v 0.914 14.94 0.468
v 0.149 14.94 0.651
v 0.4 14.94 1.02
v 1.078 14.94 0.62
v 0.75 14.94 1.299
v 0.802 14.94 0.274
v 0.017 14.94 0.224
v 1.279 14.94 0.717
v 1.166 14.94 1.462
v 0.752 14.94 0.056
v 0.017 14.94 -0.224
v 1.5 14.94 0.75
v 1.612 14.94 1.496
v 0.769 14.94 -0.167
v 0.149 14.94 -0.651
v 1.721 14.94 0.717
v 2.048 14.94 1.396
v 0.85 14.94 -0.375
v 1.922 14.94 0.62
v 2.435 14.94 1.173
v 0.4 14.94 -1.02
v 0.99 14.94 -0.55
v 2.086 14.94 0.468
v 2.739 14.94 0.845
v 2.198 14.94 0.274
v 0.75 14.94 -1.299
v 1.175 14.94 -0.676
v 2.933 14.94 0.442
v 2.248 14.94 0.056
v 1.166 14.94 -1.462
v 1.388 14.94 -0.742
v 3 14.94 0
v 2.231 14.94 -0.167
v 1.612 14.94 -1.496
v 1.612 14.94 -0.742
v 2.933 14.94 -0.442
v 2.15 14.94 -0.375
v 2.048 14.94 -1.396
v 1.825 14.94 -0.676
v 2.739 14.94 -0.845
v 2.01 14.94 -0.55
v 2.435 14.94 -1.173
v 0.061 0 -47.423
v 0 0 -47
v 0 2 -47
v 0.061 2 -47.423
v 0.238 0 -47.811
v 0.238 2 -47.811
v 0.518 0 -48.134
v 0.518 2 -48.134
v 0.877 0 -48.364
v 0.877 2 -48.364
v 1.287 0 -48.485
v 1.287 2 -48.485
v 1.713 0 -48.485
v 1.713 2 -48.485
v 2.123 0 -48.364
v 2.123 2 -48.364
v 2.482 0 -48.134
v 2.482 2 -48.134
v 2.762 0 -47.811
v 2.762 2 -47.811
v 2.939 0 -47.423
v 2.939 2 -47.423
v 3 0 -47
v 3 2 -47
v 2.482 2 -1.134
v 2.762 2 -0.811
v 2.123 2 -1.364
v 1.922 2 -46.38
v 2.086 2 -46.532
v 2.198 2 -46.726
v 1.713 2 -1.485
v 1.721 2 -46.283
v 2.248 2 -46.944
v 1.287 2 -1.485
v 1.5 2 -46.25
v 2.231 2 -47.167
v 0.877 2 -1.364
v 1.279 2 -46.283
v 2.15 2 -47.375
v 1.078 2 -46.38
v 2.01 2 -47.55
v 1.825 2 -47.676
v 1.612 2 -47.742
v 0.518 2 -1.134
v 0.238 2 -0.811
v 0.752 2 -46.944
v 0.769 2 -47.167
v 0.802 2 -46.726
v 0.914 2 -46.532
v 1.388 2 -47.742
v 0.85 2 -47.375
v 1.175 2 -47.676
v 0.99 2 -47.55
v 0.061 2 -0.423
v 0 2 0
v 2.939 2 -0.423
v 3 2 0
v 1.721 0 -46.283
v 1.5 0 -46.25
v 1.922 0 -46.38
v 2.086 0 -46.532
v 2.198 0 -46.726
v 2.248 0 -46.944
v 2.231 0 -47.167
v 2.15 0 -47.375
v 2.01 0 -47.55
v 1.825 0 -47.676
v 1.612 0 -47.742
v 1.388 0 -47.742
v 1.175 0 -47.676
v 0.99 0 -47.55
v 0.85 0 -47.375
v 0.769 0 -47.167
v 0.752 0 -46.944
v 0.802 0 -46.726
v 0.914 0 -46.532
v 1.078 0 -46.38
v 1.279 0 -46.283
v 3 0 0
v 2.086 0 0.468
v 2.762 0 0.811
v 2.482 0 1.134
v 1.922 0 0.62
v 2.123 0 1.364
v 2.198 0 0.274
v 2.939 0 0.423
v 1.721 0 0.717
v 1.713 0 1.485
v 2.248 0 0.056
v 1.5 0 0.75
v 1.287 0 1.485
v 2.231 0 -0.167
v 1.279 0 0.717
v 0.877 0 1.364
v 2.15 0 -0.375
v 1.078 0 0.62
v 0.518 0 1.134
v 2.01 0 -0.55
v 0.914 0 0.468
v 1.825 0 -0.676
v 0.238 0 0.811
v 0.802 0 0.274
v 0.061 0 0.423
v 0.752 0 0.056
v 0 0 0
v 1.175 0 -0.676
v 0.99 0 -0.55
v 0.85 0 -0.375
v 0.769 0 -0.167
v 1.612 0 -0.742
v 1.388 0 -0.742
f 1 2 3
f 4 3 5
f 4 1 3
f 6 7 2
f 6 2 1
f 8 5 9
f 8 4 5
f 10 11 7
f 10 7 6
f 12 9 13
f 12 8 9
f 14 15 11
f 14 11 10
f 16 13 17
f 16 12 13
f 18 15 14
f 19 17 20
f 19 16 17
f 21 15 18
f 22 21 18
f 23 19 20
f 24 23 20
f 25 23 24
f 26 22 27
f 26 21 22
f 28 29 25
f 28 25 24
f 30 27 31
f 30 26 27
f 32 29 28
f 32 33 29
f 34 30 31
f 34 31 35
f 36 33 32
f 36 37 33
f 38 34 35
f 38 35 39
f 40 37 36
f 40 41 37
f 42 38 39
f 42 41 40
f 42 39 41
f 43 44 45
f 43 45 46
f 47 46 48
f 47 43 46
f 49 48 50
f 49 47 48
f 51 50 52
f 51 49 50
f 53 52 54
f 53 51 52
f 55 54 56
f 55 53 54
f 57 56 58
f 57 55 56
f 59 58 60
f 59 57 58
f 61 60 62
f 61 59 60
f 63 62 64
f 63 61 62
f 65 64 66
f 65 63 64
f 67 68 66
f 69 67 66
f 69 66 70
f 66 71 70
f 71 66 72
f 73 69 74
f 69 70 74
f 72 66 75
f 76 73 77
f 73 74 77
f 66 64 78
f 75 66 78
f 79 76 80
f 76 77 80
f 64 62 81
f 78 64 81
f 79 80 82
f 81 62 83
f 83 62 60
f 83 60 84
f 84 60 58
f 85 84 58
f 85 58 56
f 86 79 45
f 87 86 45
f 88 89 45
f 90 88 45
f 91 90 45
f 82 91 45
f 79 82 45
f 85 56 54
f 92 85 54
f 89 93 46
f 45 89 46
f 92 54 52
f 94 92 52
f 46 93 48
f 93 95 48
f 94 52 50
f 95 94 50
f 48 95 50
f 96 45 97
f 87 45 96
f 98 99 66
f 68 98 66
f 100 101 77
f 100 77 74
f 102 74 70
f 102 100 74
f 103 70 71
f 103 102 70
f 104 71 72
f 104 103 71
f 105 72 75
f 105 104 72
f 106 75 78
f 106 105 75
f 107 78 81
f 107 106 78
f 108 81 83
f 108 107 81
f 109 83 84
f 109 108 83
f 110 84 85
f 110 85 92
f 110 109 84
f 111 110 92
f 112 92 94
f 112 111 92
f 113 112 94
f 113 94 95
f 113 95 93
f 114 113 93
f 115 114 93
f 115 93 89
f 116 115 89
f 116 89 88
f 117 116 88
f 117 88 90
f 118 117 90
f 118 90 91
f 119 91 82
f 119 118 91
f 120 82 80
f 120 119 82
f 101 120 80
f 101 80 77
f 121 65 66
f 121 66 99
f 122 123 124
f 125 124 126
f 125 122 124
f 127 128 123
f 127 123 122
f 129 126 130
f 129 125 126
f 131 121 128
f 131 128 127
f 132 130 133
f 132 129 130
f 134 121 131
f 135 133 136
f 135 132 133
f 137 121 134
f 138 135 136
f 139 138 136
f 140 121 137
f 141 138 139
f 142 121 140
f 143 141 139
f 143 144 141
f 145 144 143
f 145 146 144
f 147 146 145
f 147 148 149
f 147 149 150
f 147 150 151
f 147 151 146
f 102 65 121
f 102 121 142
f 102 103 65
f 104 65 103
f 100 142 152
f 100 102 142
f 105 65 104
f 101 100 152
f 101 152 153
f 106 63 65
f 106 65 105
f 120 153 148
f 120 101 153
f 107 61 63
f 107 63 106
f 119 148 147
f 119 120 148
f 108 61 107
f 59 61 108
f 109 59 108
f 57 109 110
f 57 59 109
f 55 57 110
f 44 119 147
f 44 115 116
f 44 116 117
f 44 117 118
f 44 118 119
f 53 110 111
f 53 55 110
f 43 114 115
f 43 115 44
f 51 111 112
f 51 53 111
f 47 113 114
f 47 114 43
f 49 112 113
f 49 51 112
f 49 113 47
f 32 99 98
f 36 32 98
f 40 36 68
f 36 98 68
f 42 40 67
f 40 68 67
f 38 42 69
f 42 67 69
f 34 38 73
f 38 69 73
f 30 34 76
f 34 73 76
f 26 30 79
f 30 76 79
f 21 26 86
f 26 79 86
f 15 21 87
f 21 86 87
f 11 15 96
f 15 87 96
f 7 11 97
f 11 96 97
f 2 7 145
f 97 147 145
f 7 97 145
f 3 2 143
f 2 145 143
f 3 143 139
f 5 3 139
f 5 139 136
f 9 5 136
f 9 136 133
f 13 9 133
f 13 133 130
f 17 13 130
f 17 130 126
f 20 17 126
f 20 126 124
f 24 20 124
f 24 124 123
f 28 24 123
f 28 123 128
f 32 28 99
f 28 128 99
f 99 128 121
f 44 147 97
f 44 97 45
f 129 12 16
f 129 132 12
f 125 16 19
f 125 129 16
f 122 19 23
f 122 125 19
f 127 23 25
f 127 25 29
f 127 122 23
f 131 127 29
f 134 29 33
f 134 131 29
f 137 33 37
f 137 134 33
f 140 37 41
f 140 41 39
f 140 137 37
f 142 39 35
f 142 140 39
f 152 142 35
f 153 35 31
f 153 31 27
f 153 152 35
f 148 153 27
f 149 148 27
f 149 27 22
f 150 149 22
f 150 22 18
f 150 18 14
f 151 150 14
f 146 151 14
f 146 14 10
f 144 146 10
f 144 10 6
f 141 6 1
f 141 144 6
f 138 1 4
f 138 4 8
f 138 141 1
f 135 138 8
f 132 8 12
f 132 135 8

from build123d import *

# Parameters (mm, degrees)
SKETCH1_R           = 0.75
BOSS_EXTRUDE2_DEPTH = 2
SKETCH2_R           = 1.5
SKETCH2_R_2         = 0.75
BOSS_EXTRUDE3_DEPTH = 12.94


with BuildPart() as part:
    # Sketch1 → Boss-Extrude2 (new body)
    with BuildSketch(Plane(origin=(0, 0, 0), x_dir=(1, 0, 0), z_dir=(0, 1, 0))):
        with BuildLine():
            Line((0, 0), (0, 47))
            ThreePointArc((0, 47), (1.5, 48.5), (3, 47))
            Line((3, 47), (3, 0))
            ThreePointArc((3, 0), (1.5, -1.5), (0, 0))
        make_face()
        with Locations(Location((1.5, 0, 0), (0, 0, 270))):
            Circle(SKETCH1_R, mode=Mode.SUBTRACT)
        with Locations(Location((1.5, 47, 0), (0, 0, 270))):
            Circle(SKETCH1_R, mode=Mode.SUBTRACT)
    extrude(amount=BOSS_EXTRUDE2_DEPTH)

    # Sketch2 → Boss-Extrude3 (add)
    with BuildSketch(Plane(origin=(0, 2, 0), x_dir=(1, 0, 0), z_dir=(0, 1, 0))):
        with Locations((1.5, 0)):
            Circle(SKETCH2_R)
        with Locations(Location((1.5, 0, 0), (0, 0, 270))):
            Circle(SKETCH2_R_2, mode=Mode.SUBTRACT)
    extrude(amount=BOSS_EXTRUDE3_DEPTH)


solid = part.part
